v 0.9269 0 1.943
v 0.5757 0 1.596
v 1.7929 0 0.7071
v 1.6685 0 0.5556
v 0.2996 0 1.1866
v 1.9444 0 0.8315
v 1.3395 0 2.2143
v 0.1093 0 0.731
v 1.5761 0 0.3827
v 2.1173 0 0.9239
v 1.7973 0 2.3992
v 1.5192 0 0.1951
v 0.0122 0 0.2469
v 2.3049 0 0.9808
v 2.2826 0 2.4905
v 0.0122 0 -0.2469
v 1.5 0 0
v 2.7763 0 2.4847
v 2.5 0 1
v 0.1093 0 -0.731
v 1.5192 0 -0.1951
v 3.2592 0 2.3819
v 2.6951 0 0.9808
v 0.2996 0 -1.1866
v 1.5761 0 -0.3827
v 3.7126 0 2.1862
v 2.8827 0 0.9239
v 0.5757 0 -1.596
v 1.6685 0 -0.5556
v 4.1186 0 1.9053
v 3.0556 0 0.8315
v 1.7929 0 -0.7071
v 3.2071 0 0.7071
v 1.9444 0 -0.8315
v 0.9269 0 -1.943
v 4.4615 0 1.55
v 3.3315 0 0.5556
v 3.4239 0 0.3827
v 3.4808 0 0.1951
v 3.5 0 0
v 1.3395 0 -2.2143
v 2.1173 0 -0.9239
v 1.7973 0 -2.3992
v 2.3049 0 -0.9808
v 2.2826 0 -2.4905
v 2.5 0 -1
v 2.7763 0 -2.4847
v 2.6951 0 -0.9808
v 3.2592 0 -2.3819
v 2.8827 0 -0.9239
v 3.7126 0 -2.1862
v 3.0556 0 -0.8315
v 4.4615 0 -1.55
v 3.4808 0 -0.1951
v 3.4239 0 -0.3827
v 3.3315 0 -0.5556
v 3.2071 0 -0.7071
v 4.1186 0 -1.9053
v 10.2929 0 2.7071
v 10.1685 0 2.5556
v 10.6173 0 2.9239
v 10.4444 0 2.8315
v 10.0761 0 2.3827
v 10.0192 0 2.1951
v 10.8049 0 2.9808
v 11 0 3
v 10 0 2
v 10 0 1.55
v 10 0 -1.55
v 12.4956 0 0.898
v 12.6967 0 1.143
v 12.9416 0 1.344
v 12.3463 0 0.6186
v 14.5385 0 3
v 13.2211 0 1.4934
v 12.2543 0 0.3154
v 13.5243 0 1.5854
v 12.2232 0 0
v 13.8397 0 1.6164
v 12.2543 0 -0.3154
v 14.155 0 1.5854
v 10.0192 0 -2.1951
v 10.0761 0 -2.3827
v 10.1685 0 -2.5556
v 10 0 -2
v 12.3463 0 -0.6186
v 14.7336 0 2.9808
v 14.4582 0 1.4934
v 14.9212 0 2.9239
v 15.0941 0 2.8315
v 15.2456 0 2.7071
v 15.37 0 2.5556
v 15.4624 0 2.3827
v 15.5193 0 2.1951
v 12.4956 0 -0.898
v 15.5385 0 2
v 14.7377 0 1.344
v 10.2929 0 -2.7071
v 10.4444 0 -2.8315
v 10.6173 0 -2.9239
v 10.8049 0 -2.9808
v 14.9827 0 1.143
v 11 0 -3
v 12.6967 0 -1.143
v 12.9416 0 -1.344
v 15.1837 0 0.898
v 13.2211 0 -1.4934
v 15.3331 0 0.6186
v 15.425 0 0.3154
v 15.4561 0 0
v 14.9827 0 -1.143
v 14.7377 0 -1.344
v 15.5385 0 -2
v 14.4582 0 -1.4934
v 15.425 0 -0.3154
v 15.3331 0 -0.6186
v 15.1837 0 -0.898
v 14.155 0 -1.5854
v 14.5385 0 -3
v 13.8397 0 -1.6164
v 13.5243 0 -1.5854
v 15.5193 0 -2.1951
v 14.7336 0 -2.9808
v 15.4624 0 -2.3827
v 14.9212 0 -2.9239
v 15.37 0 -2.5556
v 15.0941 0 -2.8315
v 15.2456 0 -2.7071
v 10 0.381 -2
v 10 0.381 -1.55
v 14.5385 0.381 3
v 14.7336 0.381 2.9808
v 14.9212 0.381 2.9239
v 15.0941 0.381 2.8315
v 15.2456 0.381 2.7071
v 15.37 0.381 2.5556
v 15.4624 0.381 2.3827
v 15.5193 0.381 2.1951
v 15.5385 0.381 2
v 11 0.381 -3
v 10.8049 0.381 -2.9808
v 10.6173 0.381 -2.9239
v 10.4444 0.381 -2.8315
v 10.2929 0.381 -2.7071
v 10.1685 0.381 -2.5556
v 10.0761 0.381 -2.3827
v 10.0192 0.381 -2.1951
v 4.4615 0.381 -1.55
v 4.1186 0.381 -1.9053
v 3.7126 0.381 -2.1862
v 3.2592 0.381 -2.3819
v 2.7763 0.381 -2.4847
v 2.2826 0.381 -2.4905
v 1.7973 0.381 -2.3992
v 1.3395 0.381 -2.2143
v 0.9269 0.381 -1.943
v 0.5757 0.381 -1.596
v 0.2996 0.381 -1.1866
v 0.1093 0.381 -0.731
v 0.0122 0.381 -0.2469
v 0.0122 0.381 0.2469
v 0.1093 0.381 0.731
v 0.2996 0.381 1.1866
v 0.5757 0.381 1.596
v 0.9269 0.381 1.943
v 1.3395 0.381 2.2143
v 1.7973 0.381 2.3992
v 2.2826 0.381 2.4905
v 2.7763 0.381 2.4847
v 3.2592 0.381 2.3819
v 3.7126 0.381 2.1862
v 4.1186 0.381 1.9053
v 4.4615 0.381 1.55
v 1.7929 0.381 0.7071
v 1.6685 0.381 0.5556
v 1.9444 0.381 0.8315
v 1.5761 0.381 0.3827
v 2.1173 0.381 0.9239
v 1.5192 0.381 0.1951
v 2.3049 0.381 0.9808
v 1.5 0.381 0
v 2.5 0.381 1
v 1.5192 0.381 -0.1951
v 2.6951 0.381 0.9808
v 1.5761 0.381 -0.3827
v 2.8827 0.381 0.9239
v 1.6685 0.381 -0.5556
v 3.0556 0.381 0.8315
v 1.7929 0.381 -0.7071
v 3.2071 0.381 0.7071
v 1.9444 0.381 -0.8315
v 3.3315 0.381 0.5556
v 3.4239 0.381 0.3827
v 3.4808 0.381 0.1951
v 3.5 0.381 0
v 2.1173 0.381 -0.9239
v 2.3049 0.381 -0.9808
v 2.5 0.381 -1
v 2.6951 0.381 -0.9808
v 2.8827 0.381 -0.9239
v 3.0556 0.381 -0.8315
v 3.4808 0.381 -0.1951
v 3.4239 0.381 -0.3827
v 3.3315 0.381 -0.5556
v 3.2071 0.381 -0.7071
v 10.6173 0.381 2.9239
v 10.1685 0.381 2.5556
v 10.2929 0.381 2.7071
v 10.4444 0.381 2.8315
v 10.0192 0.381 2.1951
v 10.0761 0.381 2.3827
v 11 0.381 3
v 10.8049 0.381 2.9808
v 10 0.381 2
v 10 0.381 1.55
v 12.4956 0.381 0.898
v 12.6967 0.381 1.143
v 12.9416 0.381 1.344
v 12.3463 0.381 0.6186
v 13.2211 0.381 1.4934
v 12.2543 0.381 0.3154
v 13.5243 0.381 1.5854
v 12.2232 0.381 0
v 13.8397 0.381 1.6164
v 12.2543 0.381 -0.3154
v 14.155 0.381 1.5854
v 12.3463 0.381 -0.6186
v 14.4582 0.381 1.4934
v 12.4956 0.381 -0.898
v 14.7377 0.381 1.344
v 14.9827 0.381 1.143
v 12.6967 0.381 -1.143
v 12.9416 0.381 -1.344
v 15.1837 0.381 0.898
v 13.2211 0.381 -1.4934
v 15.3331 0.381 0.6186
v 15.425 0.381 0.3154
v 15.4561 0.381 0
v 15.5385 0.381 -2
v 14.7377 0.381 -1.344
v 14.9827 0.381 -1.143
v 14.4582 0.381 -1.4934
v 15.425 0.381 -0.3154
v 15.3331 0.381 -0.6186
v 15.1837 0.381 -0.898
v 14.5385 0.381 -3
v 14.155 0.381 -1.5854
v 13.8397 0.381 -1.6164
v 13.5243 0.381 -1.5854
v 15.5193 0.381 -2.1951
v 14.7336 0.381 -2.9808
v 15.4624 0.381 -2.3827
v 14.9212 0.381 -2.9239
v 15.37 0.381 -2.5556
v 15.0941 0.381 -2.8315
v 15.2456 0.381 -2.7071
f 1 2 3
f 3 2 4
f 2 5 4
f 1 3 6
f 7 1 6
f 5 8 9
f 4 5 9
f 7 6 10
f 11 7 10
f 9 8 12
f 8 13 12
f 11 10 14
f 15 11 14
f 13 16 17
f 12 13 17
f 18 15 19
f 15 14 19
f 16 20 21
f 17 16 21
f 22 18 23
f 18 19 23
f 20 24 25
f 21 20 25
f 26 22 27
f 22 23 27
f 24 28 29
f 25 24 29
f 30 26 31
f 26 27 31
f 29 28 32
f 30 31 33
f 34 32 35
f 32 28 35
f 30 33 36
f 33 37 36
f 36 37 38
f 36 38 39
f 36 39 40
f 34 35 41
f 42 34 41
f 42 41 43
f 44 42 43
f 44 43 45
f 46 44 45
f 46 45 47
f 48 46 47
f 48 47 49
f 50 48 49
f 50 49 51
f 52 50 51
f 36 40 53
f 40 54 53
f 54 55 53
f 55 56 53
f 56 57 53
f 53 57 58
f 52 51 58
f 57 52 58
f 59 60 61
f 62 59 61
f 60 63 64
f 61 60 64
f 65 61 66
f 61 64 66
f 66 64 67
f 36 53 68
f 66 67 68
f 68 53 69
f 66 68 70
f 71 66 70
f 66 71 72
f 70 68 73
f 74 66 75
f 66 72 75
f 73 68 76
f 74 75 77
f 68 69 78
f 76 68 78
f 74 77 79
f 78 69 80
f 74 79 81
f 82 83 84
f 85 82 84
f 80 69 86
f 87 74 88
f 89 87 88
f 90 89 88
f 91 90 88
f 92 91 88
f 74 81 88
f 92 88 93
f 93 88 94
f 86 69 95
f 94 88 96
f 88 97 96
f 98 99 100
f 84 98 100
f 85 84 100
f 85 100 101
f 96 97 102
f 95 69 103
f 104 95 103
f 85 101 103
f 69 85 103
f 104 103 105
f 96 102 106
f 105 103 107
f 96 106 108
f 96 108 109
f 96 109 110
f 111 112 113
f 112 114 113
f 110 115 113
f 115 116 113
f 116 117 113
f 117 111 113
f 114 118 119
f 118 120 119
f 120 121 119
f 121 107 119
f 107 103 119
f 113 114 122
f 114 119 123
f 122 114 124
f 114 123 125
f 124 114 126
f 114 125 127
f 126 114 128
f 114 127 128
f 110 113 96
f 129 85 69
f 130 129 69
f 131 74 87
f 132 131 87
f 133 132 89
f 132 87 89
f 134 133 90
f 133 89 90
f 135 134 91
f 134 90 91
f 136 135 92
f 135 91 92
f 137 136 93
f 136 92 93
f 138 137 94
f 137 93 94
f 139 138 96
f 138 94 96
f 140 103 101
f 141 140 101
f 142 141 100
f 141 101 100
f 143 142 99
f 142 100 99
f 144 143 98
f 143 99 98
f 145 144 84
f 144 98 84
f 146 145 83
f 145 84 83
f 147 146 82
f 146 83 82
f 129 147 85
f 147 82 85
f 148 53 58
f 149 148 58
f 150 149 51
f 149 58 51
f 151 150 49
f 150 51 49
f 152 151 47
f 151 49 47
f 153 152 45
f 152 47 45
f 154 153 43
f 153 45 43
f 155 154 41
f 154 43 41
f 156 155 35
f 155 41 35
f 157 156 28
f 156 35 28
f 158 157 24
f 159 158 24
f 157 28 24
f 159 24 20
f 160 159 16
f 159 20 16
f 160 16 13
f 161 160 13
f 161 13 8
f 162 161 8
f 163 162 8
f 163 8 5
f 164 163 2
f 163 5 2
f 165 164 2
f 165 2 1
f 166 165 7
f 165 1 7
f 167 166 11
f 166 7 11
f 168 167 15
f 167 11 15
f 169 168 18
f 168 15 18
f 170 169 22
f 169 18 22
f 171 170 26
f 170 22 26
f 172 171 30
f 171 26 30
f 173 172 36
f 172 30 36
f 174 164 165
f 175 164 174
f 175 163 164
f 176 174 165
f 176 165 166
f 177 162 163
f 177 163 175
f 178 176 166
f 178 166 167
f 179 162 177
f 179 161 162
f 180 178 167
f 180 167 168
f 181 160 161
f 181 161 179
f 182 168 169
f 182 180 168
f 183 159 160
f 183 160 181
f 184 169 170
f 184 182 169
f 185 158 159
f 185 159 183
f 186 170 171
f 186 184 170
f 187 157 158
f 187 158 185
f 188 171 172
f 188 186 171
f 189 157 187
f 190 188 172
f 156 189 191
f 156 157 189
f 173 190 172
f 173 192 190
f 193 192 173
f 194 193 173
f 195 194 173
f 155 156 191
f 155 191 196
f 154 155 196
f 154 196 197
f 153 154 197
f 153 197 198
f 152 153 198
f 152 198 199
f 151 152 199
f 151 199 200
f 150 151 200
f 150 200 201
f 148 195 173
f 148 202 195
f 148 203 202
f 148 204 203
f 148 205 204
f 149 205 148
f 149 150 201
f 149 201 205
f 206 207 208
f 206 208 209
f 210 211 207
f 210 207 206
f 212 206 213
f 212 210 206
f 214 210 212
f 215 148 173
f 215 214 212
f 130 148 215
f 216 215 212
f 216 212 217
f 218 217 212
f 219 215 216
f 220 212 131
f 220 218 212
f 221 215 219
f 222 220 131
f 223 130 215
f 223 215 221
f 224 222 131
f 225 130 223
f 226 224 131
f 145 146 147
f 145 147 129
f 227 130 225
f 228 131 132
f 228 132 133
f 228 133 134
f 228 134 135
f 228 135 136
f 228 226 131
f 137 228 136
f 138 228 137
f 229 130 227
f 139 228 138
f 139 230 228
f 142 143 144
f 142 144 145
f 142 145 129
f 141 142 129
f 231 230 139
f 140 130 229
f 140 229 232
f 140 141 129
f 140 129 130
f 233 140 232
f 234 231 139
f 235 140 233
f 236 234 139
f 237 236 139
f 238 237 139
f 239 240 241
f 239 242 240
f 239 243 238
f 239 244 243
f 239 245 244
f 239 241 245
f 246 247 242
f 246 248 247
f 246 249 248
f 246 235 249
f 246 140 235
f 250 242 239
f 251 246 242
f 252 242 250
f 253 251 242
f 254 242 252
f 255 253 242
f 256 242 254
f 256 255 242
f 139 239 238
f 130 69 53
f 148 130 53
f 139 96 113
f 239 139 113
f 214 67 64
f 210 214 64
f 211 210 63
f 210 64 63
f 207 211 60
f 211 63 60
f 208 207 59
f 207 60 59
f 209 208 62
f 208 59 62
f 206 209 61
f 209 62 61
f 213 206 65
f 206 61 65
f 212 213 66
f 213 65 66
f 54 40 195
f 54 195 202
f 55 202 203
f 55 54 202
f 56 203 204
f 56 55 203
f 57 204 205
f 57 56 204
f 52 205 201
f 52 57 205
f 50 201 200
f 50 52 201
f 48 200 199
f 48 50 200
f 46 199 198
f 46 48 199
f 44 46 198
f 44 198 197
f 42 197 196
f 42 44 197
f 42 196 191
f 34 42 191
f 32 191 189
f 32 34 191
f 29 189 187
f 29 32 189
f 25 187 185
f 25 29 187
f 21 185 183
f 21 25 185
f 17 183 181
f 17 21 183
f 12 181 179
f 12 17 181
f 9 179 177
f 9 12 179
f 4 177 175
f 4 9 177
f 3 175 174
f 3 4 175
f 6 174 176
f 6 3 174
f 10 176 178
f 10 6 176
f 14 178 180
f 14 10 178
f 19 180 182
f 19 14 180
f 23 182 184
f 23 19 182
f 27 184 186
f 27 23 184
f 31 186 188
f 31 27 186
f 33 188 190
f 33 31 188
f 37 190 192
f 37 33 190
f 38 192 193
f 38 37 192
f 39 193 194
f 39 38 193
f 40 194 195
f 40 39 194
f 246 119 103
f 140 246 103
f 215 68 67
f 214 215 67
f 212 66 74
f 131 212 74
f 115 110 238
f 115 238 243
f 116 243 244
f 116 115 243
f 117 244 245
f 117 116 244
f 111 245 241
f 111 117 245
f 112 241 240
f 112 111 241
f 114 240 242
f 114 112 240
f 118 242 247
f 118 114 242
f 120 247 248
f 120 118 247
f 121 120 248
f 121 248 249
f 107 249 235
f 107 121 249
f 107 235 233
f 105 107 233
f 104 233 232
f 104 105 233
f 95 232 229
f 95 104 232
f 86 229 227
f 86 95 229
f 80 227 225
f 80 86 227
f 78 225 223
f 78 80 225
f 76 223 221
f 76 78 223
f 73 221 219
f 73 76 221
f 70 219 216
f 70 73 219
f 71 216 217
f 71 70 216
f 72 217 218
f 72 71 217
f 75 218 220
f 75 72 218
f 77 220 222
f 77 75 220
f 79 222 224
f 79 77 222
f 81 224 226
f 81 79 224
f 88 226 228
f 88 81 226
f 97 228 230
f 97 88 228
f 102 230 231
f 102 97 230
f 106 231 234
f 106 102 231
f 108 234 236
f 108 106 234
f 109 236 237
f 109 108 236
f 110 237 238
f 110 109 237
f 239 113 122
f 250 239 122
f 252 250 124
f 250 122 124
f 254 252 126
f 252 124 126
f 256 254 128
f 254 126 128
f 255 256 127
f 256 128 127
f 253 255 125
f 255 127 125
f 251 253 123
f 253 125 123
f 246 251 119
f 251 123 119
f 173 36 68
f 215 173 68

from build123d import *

# Parameters (mm, degrees)
SKETCH1_R           = 1
SKETCH1_R_2         = 1.616439125
BOSS_EXTRUDE4_DEPTH = 0.381


with BuildPart() as part:
    # Sketch1 → Boss-Extrude4 (new body)
    with BuildSketch(Plane(origin=(0, 0, 0), x_dir=(1, 0, 0), z_dir=(0, 1, 0))):
        with BuildLine():
            Line((4.461504525, -1.55), (10, -1.55))
            Line((10, -1.55), (10, -2))
            ThreePointArc((10, -2), (10.292893219, -2.707106781), (11, -3))
            Line((11, -3), (14.538495475, -3))
            ThreePointArc((14.538495475, -3), (15.245602257, -2.707106781), (15.538495475, -2))
            Line((15.538495475, -2), (15.538495475, 2))
            ThreePointArc((15.538495475, 2), (15.245602257, 2.707106781), (14.538495475, 3))
            Line((14.538495475, 3), (11, 3))
            ThreePointArc((11, 3), (10.292893219, 2.707106781), (10, 2))
            Line((10, 2), (10, 1.55))
            Line((10, 1.55), (4.461504525, 1.55))
            ThreePointArc((4.461504525, 1.55), (0, 0), (4.461504525, -1.55))
        make_face()
        with Locations((2.5, 0)):
            Circle(SKETCH1_R, mode=Mode.SUBTRACT)
        with Locations((13.839657546, 0)):
            Circle(SKETCH1_R_2, mode=Mode.SUBTRACT)
    extrude(amount=BOSS_EXTRUDE4_DEPTH)


solid = part.part
